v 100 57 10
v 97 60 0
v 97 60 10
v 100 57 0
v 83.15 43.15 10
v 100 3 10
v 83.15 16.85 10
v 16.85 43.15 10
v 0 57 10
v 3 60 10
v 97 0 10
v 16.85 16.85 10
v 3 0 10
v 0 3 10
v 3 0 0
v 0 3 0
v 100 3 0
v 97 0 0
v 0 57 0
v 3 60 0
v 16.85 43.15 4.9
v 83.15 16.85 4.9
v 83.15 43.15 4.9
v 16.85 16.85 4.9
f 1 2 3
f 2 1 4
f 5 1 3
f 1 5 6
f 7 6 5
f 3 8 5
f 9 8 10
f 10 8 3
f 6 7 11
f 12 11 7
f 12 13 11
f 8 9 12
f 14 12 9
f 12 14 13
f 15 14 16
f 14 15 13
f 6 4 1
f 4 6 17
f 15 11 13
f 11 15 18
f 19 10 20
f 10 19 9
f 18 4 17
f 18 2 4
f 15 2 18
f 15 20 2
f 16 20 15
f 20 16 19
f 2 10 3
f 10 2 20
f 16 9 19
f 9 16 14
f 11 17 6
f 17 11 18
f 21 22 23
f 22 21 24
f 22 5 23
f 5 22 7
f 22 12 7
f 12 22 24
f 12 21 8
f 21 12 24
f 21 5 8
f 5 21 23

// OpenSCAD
$fn = 32;

// ----------------------------------------------------------------------
// Windowed plate: 1 voids, 100 x 60 x 10 mm
// ----------------------------------------------------------------------

// --- parameters (mm) ---
plate_l = 100;            // plate length, X
plate_w = 60;             // plate width, Y
plate_t = 10;             // plate thickness, Z
edge_margin = 12;         // wall from the plate edge to any window
win1_l = 66.3;            // window length
win1_w = 26.3;            // window width
depth_1 = 5.1;            // depth of void 1 (full thickness = through)
corner_c = 3;             // corner chamfer of the plate

profile = [[3, 0], [97, 0], [100, 3], [100, 57], [97, 60], [3, 60], [0, 57], [0, 3]];  // primary outline, 8 points, counter clockwise
void_1 = [[16.85, 16.85], [83.15, 16.85], [83.15, 43.15], [16.85, 43.15]];  // large central window, 4 points

// --- the one profile operation ---
difference() {
  linear_extrude(height = plate_t) polygon(points = profile);
  translate([0, 0, plate_t - depth_1])
    linear_extrude(height = depth_1 + 1) polygon(points = void_1);
}
